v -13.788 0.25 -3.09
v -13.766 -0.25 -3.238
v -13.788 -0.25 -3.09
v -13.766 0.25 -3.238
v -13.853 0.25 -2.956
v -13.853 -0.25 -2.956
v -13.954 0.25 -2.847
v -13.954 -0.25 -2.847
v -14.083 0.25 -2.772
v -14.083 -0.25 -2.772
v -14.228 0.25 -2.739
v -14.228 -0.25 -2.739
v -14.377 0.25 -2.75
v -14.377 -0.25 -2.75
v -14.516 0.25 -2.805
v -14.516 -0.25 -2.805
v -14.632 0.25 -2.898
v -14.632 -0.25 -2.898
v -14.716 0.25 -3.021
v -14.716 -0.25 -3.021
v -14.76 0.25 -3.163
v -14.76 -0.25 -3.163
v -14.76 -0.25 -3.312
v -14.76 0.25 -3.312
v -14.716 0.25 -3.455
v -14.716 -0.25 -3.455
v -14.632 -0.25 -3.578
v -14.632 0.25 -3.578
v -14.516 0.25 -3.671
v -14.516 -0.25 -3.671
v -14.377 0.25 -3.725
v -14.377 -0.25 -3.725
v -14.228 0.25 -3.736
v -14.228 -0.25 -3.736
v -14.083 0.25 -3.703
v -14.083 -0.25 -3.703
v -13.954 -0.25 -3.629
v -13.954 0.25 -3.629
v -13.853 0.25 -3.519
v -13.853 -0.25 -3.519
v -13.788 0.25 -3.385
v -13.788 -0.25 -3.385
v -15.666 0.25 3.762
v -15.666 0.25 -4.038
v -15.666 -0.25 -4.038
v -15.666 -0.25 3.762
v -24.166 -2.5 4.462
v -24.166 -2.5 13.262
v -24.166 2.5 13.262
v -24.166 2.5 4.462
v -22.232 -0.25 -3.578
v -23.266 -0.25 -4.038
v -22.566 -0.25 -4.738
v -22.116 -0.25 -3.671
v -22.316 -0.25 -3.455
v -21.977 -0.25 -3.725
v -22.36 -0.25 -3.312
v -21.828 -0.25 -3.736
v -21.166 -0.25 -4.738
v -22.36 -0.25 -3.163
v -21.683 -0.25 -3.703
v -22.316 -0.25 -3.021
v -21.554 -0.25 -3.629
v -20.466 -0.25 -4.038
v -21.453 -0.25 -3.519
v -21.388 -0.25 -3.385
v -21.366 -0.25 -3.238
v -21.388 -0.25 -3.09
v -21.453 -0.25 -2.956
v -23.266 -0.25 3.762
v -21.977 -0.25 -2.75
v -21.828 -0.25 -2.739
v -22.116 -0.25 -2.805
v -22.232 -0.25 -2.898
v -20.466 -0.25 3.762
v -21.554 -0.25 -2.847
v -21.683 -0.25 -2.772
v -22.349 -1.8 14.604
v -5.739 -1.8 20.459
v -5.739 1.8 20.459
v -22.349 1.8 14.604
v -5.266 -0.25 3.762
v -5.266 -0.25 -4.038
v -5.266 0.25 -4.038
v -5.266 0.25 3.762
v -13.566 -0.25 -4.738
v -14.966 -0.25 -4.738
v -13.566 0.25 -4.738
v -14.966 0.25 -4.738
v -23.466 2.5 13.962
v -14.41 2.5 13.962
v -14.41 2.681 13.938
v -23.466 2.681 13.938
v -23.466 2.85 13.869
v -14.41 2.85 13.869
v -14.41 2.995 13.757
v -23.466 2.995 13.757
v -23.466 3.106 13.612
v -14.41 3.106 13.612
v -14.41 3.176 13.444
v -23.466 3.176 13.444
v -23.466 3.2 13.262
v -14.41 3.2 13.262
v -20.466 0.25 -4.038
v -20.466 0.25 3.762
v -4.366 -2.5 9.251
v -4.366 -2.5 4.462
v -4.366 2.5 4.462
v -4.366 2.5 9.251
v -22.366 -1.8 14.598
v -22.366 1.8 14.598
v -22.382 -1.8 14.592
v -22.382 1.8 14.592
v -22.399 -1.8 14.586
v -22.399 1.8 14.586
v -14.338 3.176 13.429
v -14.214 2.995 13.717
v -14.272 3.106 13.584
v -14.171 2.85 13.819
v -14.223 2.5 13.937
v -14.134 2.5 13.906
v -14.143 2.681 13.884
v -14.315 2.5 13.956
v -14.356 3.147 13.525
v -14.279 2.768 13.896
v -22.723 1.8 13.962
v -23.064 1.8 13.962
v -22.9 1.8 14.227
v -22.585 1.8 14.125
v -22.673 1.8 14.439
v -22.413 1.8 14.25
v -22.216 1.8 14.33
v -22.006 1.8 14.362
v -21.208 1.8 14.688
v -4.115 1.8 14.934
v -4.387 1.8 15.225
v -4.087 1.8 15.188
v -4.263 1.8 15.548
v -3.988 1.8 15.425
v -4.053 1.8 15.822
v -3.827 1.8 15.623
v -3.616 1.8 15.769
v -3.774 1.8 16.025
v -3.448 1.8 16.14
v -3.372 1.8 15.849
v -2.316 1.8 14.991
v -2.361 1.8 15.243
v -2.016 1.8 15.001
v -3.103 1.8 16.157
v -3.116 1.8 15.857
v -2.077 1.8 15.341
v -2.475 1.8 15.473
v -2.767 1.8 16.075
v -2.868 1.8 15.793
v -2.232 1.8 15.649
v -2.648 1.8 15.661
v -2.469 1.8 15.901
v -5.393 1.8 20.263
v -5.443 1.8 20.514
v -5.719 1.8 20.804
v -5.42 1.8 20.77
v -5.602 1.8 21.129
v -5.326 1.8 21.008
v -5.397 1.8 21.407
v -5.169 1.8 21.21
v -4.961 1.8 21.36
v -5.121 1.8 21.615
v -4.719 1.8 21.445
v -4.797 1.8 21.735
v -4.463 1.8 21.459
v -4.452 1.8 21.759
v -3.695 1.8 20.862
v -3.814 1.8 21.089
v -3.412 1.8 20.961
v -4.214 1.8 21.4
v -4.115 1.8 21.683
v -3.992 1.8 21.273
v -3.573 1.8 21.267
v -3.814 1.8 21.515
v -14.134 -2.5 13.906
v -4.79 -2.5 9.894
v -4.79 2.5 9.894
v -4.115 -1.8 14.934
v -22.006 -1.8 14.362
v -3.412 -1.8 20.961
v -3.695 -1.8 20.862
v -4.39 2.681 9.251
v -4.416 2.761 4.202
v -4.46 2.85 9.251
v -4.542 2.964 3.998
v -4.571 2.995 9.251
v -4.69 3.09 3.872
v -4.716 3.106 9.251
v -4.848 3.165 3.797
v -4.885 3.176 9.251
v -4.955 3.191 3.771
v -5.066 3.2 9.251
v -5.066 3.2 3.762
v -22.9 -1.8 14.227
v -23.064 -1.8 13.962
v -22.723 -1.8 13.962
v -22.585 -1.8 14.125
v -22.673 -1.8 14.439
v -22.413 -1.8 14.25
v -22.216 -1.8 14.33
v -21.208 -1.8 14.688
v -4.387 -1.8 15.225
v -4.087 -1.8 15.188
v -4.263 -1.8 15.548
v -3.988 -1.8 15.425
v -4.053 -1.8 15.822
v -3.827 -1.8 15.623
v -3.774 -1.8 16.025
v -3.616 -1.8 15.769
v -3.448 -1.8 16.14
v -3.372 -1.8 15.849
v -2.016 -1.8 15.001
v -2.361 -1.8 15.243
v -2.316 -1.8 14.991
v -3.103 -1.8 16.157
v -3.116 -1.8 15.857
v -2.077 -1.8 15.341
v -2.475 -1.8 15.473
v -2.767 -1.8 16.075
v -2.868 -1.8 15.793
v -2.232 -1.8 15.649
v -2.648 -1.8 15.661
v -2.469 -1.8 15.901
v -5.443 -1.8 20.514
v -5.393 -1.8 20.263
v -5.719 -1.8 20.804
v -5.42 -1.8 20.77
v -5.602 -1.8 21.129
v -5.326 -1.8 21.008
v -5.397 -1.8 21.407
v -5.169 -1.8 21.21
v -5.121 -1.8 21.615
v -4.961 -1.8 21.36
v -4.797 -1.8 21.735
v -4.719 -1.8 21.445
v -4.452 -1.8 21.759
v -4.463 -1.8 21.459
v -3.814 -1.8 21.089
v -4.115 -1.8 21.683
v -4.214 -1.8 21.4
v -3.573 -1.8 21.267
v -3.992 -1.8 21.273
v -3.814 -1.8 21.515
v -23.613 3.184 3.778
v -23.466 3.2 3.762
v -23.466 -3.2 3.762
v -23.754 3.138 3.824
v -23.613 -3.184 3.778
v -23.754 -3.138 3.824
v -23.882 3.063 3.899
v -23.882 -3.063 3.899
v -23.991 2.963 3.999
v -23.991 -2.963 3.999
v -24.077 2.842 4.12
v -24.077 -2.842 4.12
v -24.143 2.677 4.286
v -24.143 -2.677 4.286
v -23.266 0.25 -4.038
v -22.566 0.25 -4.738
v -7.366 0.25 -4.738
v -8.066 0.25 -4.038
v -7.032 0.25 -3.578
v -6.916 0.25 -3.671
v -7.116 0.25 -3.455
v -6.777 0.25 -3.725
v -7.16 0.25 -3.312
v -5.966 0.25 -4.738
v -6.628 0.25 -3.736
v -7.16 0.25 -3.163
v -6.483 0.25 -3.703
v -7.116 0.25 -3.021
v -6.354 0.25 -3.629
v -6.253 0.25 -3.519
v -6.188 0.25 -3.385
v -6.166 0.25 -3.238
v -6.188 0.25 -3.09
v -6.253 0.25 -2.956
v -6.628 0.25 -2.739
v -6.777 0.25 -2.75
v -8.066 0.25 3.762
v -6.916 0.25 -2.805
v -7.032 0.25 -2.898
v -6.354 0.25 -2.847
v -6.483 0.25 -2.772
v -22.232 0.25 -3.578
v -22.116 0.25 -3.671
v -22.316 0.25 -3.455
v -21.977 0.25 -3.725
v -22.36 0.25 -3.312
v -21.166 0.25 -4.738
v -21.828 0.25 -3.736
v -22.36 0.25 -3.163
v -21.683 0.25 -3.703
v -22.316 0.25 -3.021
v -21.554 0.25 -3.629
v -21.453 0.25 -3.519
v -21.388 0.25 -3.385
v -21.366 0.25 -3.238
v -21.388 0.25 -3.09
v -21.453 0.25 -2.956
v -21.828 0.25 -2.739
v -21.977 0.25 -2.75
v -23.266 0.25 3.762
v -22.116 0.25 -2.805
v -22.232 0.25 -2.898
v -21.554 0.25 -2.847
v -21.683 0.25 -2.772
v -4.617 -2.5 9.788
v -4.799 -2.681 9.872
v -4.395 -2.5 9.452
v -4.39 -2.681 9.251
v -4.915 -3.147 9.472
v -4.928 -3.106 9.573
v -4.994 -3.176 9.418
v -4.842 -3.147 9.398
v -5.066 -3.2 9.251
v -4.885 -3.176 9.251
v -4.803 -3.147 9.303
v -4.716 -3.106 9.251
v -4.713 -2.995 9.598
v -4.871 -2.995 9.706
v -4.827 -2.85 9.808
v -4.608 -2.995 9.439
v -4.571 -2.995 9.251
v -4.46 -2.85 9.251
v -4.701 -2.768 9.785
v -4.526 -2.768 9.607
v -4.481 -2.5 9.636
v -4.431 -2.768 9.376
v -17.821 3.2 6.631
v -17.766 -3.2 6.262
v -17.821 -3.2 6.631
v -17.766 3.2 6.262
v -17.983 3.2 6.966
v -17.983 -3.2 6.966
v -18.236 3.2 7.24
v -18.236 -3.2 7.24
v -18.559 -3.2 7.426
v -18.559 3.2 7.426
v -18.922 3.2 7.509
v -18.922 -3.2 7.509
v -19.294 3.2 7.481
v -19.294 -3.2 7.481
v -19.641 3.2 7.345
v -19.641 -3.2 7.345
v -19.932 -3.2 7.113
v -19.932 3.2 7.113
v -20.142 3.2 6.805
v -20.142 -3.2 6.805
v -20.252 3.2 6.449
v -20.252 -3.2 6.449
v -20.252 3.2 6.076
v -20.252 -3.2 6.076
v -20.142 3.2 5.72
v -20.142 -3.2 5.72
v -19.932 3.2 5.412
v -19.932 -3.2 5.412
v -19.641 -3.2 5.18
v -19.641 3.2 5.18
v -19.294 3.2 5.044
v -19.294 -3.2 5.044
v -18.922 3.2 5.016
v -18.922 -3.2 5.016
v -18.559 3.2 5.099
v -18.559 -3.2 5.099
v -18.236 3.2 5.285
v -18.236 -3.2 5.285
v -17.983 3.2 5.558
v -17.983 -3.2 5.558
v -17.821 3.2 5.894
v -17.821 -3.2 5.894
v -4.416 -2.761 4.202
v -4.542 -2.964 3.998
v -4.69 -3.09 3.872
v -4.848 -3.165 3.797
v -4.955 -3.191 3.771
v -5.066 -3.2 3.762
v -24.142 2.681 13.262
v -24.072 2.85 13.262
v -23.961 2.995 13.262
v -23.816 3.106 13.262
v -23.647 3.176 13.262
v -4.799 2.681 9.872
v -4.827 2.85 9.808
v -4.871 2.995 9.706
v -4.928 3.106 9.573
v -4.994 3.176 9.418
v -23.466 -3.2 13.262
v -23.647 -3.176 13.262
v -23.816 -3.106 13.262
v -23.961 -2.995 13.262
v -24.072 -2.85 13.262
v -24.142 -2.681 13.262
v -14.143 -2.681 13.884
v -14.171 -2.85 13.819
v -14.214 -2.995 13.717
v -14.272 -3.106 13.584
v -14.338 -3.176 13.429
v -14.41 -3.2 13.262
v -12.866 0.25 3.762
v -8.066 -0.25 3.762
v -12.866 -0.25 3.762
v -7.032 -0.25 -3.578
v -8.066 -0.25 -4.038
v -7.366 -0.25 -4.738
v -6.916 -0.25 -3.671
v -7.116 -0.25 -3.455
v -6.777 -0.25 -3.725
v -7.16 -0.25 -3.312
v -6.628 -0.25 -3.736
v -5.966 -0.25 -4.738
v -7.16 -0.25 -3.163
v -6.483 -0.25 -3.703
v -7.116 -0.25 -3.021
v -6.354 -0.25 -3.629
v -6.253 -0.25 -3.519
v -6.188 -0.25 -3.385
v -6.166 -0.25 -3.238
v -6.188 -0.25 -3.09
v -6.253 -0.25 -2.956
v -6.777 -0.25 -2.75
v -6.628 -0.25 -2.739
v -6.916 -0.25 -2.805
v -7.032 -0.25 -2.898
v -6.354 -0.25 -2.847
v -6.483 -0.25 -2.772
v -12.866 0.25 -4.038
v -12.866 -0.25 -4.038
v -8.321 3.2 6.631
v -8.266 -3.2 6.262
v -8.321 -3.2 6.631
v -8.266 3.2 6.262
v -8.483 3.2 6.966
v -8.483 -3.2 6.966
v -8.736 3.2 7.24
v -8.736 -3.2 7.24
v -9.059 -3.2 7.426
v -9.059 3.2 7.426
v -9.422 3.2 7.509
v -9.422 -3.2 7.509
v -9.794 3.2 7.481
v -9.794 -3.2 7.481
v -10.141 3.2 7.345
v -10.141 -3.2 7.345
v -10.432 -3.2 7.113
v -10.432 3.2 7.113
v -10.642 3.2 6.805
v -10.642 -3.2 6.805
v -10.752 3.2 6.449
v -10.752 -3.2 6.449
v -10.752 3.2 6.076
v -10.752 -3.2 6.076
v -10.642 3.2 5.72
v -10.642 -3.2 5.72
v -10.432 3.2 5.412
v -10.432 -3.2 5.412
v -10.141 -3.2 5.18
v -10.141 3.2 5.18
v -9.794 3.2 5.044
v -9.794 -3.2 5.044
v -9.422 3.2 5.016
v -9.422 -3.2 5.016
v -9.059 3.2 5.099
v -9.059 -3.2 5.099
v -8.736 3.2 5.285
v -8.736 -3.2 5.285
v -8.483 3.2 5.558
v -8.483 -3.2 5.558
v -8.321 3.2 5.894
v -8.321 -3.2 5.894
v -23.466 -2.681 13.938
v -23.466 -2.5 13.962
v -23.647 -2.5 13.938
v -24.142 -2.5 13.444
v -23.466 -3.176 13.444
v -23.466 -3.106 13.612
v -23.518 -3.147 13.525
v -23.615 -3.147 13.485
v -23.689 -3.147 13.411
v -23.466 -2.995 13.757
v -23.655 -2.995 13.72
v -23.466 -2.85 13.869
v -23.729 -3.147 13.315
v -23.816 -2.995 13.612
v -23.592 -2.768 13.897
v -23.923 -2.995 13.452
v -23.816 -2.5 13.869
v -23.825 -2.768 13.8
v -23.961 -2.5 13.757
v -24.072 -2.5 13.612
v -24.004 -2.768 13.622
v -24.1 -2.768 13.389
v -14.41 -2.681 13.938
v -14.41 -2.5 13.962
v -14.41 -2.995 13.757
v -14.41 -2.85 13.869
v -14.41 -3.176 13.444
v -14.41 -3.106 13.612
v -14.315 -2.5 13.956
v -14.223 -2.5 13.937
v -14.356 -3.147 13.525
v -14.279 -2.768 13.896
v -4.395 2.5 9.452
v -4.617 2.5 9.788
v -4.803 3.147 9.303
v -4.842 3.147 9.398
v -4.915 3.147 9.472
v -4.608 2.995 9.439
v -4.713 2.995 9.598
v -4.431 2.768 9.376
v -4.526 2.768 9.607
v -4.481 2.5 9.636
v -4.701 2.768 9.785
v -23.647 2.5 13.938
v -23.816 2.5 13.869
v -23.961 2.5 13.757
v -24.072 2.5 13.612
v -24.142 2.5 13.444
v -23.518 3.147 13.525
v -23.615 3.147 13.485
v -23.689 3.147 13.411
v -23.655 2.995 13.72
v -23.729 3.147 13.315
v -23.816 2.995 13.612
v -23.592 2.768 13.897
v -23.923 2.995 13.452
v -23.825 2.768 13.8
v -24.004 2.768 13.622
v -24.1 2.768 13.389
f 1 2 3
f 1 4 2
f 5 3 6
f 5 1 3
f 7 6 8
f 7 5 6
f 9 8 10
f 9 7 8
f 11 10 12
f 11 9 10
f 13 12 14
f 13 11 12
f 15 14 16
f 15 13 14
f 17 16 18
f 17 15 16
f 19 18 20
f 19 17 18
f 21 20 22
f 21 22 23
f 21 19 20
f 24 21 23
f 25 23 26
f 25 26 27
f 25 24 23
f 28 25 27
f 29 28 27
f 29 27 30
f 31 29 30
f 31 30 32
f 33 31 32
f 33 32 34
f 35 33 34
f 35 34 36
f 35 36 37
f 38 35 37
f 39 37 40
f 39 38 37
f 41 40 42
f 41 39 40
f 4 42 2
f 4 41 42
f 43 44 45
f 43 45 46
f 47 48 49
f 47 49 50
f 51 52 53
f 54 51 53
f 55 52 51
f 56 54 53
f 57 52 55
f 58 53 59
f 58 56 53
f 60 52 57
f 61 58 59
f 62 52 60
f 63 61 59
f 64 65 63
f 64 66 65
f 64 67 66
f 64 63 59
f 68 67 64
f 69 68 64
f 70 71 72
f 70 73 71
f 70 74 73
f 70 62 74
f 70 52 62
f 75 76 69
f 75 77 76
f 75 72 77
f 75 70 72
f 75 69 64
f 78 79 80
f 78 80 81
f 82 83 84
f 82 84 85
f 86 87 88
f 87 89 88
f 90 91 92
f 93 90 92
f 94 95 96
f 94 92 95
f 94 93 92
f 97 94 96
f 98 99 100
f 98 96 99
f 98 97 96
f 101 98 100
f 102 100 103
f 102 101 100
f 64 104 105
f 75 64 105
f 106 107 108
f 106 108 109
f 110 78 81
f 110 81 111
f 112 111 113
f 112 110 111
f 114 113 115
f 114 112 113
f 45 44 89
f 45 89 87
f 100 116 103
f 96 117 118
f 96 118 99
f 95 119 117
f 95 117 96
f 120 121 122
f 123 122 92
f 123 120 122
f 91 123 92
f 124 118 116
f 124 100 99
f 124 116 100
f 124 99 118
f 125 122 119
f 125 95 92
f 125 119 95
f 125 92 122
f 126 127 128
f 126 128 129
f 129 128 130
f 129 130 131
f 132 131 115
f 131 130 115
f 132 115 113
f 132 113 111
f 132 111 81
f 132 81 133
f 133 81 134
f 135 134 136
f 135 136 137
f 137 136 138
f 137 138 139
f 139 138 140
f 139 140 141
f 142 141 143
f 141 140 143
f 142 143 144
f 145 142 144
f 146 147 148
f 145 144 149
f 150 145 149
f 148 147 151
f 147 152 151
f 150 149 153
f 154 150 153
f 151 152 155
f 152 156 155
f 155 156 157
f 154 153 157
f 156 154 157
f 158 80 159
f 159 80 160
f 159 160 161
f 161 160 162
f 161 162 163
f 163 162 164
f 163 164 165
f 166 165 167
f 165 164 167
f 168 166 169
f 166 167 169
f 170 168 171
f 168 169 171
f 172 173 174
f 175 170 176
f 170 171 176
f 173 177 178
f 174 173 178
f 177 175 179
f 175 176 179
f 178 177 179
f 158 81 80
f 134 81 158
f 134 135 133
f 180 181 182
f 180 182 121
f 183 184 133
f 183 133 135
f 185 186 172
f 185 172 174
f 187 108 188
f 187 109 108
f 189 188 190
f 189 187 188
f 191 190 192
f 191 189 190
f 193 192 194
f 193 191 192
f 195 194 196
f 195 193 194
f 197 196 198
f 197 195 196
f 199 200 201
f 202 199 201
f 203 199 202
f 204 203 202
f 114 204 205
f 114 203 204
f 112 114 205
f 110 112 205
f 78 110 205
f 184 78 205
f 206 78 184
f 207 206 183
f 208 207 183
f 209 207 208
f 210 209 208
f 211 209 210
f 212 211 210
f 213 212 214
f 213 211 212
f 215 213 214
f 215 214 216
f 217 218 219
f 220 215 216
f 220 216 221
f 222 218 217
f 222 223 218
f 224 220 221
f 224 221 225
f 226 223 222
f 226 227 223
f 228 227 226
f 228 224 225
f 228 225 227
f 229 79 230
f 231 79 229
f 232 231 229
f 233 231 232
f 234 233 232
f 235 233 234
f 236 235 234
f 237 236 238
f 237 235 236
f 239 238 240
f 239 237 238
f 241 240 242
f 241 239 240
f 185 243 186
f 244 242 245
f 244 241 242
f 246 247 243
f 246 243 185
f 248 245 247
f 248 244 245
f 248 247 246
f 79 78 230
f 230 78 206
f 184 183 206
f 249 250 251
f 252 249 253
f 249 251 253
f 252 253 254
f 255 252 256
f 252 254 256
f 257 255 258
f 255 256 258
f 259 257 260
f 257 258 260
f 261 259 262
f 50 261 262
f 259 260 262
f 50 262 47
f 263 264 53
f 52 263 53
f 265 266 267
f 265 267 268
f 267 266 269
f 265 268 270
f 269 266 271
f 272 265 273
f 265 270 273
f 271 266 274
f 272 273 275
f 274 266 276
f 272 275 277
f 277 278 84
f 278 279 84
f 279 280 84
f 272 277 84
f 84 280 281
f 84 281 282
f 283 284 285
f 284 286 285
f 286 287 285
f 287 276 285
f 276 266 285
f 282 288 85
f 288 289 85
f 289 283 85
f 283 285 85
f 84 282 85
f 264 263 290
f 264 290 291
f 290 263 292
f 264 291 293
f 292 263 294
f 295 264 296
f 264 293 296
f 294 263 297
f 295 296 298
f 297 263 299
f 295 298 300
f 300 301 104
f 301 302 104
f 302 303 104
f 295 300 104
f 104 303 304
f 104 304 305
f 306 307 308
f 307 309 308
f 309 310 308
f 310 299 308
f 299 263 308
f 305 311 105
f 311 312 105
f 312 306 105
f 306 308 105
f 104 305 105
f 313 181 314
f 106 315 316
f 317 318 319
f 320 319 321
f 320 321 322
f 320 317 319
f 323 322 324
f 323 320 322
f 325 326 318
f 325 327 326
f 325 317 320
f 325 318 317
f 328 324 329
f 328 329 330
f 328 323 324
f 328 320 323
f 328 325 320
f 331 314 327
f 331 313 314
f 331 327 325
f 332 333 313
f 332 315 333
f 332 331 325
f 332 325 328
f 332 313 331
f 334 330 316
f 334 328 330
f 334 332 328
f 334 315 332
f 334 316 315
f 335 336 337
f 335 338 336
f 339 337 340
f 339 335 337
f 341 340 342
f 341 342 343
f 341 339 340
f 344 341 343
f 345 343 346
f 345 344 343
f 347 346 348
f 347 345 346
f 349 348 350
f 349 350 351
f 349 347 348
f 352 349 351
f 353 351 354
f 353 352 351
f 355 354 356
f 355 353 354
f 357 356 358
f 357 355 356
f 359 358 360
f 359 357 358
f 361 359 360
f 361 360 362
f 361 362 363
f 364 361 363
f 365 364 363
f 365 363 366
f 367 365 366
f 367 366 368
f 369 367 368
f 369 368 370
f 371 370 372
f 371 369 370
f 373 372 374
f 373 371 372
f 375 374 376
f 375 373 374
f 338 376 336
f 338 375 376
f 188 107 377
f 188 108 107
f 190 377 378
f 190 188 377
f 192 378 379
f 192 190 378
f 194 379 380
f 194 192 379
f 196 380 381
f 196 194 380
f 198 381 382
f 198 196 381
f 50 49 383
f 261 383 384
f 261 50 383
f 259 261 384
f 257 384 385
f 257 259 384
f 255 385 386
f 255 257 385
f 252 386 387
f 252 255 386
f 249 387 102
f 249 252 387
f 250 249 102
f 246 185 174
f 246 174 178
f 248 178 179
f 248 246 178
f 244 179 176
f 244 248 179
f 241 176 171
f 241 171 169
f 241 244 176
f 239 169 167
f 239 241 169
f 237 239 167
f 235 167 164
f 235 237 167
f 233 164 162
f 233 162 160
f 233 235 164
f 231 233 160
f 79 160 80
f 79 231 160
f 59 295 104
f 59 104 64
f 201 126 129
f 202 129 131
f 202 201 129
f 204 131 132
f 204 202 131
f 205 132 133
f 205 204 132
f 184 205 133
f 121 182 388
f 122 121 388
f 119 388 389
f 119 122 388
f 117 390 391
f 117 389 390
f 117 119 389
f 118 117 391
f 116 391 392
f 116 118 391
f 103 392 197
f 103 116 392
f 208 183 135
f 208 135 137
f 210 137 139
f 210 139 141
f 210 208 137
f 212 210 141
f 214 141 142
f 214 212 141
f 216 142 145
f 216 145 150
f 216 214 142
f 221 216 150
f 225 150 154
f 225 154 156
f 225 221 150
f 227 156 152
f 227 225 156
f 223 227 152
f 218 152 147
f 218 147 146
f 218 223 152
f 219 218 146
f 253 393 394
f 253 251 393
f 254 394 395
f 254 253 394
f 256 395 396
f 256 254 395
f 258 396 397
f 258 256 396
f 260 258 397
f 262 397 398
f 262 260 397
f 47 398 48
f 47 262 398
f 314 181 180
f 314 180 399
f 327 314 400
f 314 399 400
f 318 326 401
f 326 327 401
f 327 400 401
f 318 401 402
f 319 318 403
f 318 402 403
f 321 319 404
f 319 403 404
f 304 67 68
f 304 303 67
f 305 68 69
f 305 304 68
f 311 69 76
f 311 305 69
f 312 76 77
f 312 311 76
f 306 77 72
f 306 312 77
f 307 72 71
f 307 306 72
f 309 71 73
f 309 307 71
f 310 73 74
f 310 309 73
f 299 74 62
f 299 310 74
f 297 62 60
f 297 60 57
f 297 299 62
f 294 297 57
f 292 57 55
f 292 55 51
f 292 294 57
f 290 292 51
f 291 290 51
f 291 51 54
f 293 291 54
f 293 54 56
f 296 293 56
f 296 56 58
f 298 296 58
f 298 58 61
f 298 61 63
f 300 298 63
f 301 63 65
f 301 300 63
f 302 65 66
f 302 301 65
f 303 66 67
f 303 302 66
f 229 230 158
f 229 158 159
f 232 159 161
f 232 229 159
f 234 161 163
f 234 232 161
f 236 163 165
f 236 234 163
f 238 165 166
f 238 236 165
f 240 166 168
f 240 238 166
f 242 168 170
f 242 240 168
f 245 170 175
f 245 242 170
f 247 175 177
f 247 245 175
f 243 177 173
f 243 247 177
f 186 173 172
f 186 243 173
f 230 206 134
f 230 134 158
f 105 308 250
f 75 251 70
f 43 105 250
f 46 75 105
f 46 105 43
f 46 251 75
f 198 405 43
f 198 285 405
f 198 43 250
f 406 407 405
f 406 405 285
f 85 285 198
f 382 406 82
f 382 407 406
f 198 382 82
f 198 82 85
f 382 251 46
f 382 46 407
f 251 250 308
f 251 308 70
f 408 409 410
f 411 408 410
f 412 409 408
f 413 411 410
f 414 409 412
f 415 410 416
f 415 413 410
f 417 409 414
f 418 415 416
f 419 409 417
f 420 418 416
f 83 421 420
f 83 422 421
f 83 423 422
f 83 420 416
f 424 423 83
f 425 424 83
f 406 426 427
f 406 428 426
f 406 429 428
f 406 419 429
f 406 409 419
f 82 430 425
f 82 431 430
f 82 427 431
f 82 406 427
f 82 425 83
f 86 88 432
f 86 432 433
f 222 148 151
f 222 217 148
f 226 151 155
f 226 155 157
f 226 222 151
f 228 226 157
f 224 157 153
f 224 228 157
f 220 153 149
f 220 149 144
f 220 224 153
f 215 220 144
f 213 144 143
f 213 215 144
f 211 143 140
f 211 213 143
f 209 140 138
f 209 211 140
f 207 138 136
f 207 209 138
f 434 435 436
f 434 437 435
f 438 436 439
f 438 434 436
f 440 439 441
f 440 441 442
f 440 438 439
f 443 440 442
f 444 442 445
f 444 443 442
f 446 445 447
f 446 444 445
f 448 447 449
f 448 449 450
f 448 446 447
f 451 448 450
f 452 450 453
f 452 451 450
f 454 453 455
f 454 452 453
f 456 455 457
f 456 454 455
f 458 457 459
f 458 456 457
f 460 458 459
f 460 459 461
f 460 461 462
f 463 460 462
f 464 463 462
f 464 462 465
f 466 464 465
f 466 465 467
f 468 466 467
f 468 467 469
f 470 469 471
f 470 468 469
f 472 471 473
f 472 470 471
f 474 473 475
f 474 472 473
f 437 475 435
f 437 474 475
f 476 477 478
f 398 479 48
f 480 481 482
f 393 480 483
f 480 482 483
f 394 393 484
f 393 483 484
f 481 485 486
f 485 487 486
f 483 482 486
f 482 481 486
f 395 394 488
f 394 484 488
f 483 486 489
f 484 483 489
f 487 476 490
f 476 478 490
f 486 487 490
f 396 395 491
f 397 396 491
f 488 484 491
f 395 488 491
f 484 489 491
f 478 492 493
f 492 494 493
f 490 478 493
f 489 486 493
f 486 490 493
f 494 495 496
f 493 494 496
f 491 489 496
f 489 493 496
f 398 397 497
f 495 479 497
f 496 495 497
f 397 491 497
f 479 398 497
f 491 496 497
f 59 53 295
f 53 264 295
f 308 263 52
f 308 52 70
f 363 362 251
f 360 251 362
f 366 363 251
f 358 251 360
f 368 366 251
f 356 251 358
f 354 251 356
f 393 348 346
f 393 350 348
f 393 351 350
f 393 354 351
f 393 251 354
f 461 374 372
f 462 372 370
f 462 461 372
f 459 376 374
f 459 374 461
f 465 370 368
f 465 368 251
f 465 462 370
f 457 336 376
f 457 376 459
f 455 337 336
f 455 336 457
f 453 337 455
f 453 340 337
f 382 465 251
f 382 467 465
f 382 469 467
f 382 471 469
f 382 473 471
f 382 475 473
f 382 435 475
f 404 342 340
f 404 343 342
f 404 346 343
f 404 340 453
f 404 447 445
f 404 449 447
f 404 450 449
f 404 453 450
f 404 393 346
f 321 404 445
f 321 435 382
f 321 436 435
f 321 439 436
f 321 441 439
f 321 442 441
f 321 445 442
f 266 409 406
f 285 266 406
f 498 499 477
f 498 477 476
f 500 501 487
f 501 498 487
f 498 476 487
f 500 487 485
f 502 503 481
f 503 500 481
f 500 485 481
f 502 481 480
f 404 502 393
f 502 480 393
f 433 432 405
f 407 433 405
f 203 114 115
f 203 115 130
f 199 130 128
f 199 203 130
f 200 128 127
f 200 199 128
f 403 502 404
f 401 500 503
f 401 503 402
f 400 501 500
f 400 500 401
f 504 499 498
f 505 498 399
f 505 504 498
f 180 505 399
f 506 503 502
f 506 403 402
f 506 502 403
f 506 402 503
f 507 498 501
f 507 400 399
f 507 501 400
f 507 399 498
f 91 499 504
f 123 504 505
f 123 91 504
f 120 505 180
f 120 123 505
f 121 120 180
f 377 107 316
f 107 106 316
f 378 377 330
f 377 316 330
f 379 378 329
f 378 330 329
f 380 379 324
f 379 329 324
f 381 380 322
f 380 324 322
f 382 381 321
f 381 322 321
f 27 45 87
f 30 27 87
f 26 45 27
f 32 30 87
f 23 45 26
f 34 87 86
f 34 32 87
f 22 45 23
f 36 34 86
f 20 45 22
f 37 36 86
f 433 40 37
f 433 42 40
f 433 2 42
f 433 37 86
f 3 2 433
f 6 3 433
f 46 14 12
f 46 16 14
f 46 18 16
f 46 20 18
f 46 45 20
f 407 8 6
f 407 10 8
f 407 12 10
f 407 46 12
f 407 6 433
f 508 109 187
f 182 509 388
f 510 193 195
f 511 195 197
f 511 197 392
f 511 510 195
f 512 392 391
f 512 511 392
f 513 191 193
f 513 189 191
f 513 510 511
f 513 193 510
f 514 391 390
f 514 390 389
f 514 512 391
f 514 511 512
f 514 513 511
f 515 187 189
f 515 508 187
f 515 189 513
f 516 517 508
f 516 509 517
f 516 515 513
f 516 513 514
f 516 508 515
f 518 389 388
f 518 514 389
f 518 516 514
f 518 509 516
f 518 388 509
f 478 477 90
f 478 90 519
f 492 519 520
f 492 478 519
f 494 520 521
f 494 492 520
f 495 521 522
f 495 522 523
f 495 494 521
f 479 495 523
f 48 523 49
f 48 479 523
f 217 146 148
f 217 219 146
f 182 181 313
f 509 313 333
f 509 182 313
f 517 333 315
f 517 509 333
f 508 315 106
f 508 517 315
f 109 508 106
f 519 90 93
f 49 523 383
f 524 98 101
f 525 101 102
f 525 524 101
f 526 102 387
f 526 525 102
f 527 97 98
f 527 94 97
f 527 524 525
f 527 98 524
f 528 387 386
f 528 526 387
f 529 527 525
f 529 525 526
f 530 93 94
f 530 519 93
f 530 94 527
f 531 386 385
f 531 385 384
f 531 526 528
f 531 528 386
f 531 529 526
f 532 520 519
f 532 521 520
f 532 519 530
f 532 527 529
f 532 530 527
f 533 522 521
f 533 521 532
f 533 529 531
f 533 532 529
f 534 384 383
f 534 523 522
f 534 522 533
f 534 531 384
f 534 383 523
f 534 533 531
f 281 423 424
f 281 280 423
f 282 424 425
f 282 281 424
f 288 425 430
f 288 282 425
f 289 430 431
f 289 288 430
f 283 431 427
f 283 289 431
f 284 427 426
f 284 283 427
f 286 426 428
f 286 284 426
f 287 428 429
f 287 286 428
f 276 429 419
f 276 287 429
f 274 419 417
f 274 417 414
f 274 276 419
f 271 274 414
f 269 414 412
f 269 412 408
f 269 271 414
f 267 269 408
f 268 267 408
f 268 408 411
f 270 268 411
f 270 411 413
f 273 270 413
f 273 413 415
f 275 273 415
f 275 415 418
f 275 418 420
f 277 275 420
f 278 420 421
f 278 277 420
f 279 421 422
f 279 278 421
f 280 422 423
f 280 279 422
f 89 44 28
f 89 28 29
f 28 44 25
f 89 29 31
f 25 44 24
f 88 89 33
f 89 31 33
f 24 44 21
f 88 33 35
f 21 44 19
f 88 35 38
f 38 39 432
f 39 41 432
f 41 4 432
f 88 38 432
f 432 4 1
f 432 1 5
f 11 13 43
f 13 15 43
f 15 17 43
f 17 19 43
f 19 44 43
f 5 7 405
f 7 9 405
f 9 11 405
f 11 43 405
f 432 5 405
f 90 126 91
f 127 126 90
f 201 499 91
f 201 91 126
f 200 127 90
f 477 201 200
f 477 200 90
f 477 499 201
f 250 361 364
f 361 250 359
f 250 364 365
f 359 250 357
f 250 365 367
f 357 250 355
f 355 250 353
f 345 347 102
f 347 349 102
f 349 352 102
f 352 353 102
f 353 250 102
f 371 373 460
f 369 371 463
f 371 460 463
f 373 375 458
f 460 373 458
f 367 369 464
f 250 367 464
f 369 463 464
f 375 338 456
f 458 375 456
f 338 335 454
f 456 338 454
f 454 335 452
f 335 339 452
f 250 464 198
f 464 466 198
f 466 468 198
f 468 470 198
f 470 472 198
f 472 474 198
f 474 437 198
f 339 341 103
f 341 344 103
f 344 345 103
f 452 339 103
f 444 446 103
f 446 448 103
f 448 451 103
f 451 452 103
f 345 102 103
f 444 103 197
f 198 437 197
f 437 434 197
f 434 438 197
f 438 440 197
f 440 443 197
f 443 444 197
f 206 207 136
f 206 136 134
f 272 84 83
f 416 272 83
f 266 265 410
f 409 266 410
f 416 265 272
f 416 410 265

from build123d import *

# Parameters (mm, degrees)
F0_R     = 1.25
F1_DEPTH = 3.2
F2_R     = 0.7
F4_DEPTH = 1.8
F5_W     = 2.8
F5_H     = 9.0560415828
F5_R     = 0.5
F6_DEPTH = 0.25
F7_SIZE  = 0.7
F9_DEPTH = 3.6


with BuildPart() as f1:
    # F0 (on Front) → F1 (new body, symmetric)
    with BuildSketch(Plane.XZ):
        Polygon((-14.2658203304, 13.9623457611), (-24.1658203304, 13.9623457611), (-24.1658203304, 3.7623457611), (-4.3658203304, 3.7623457611), (-4.3658203304, 9.7123457611), align=None)
        with Locations((-19.0158203304, 6.2623457611)):
            Circle(F0_R, mode=Mode.SUBTRACT)
        with Locations((-9.5158203304, 6.2623457611)):
            Circle(F0_R, mode=Mode.SUBTRACT)
    extrude(amount=F1_DEPTH, both=True)

    # F2
    f2_edges = [f1.edges().sort_by_distance(p)[0] for p in [
        (-4.36582, 0, 9.712346),
        (-14.26582, 0, 13.962346),
        (-24.16582, 0, 13.962346),
        (-4.36582, 0, 3.762346),
        (-24.16582, 0, 3.762346),
        (-19.21582, -3.2, 13.962346),
        (-9.31582, -3.2, 11.837346),
        (-4.36582, -3.2, 6.737346),
        (-4.36582, 3.2, 6.737346),
        (-9.31582, 3.2, 11.837346),
        (-19.21582, 3.2, 13.962346),
        (-24.16582, -3.2, 8.862346),
        (-24.16582, 3.2, 8.862346),
    ]]
    fillet(f2_edges, radius=F2_R)

    # F3 (on Front) → F4 (join, symmetric)
    with BuildSketch(Plane.XZ):
        with BuildLine():
            Line((-4.3866957854, 15.2251207005), (-22.0158203304, 14.6623457611))
            ThreePointArc((-22.0158203304, 14.6623457611), (-23.165946247, 13.572328355), (-22.2182437598, 12.3023726214))
            Line((-22.2182437598, 12.3023726214), (-22.2182437598, 12.6108806694))
            ThreePointArc((-22.2182437598, 12.6108806694), (-22.8638430635, 13.5776541553), (-22.0062482997, 14.3624985062))
            Line((-22.0062482997, 14.3624985062), (-4.1153620949, 14.9336296691))
            ThreePointArc((-4.1153620949, 14.9336296691), (-3.2445364224, 15.8618875256), (-2.3162785659, 14.991061853))
            Line((-2.3162785659, 14.991061853), (-2.0164313111, 15.0006338837))
            ThreePointArc((-2.0164313111, 15.0006338837), (-3.1026751203, 16.1569997534), (-4.3866957854, 15.2251207005))
        make_face()
    extrude(amount=F4_DEPTH, both=True)

    # F5 (on Front) → F6 (join, symmetric)
    with BuildSketch(Plane.XZ):
        with Locations((-21.8658203304, -0.2096334475)):
            Rectangle(F5_W, F5_H)
        with Locations((-21.8658203304, -3.2376542389)):
            Circle(F5_R, mode=Mode.SUBTRACT)
        with Locations((-14.2658203304, -0.2096334475)):
            Rectangle(F5_W, F5_H)
        with Locations((-14.2658203304, -3.2376542389)):
            Circle(F5_R, mode=Mode.SUBTRACT)
        with Locations((-6.6658203304, -0.2096334475)):
            Rectangle(F5_W, F5_H)
        with Locations((-6.6658203304, -3.2376542389)):
            Circle(F5_R, mode=Mode.SUBTRACT)
    extrude(amount=F6_DEPTH, both=True)

    # F7
    f7_edges = [f1.edges().sort_by_distance(p)[0] for p in [
        (-12.86582, 0, -4.737654),
        (-15.66582, 0, -4.737654),
        (-20.46582, 0, -4.737654),
        (-23.26582, 0, -4.737654),
        (-5.26582, 0, -4.737654),
        (-8.06582, 0, -4.737654),
    ]]
    chamfer(f7_edges, length=F7_SIZE)

    # F8 (on face) → F9 (join, through all)
    with BuildSketch(Plane.XZ.offset(1.8)):
        with BuildLine():
            Line((-3.6950556462, 20.861555612), (-3.4121199517, 20.961292229))
            ThreePointArc((-3.4121199517, 20.961292229), (-4.7971701976, 21.7353058315), (-5.7393789628, 20.4587072715))
            Line((-5.7393789628, 20.4587072715), (-22.3494407238, 14.6035557305))
            Line((-22.3494407238, 14.6035557305), (-22.3988404472, 14.5861420164))
            ThreePointArc((-22.3988404472, 14.5861420164), (-23.1509491325, 13.2564048538), (-21.9777702725, 12.2778754681))
            Line((-21.9777702725, 12.2778754681), (-21.9777702725, 12.5778754681))
            ThreePointArc((-21.9777702725, 12.5778754681), (-22.8575253326, 13.319893669), (-22.2744995865, 14.3121844306))
            Line((-22.2744995865, 14.3121844306), (-5.3926698134, 20.2631359101))
            ThreePointArc((-5.3926698134, 20.2631359101), (-4.8430725807, 21.4111528446), (-3.6950556462, 20.861555612))
        make_face()
        with BuildLine():
            Line((-22.3988404472, 14.5861420164), (-22.3494407238, 14.6035557305))
            ThreePointArc((-22.3494407238, 14.6035557305), (-22.3742362034, 14.5951201251), (-22.3988404472, 14.5861420164))
        make_face()
    extrude(amount=-F9_DEPTH)


solid = f1.part
